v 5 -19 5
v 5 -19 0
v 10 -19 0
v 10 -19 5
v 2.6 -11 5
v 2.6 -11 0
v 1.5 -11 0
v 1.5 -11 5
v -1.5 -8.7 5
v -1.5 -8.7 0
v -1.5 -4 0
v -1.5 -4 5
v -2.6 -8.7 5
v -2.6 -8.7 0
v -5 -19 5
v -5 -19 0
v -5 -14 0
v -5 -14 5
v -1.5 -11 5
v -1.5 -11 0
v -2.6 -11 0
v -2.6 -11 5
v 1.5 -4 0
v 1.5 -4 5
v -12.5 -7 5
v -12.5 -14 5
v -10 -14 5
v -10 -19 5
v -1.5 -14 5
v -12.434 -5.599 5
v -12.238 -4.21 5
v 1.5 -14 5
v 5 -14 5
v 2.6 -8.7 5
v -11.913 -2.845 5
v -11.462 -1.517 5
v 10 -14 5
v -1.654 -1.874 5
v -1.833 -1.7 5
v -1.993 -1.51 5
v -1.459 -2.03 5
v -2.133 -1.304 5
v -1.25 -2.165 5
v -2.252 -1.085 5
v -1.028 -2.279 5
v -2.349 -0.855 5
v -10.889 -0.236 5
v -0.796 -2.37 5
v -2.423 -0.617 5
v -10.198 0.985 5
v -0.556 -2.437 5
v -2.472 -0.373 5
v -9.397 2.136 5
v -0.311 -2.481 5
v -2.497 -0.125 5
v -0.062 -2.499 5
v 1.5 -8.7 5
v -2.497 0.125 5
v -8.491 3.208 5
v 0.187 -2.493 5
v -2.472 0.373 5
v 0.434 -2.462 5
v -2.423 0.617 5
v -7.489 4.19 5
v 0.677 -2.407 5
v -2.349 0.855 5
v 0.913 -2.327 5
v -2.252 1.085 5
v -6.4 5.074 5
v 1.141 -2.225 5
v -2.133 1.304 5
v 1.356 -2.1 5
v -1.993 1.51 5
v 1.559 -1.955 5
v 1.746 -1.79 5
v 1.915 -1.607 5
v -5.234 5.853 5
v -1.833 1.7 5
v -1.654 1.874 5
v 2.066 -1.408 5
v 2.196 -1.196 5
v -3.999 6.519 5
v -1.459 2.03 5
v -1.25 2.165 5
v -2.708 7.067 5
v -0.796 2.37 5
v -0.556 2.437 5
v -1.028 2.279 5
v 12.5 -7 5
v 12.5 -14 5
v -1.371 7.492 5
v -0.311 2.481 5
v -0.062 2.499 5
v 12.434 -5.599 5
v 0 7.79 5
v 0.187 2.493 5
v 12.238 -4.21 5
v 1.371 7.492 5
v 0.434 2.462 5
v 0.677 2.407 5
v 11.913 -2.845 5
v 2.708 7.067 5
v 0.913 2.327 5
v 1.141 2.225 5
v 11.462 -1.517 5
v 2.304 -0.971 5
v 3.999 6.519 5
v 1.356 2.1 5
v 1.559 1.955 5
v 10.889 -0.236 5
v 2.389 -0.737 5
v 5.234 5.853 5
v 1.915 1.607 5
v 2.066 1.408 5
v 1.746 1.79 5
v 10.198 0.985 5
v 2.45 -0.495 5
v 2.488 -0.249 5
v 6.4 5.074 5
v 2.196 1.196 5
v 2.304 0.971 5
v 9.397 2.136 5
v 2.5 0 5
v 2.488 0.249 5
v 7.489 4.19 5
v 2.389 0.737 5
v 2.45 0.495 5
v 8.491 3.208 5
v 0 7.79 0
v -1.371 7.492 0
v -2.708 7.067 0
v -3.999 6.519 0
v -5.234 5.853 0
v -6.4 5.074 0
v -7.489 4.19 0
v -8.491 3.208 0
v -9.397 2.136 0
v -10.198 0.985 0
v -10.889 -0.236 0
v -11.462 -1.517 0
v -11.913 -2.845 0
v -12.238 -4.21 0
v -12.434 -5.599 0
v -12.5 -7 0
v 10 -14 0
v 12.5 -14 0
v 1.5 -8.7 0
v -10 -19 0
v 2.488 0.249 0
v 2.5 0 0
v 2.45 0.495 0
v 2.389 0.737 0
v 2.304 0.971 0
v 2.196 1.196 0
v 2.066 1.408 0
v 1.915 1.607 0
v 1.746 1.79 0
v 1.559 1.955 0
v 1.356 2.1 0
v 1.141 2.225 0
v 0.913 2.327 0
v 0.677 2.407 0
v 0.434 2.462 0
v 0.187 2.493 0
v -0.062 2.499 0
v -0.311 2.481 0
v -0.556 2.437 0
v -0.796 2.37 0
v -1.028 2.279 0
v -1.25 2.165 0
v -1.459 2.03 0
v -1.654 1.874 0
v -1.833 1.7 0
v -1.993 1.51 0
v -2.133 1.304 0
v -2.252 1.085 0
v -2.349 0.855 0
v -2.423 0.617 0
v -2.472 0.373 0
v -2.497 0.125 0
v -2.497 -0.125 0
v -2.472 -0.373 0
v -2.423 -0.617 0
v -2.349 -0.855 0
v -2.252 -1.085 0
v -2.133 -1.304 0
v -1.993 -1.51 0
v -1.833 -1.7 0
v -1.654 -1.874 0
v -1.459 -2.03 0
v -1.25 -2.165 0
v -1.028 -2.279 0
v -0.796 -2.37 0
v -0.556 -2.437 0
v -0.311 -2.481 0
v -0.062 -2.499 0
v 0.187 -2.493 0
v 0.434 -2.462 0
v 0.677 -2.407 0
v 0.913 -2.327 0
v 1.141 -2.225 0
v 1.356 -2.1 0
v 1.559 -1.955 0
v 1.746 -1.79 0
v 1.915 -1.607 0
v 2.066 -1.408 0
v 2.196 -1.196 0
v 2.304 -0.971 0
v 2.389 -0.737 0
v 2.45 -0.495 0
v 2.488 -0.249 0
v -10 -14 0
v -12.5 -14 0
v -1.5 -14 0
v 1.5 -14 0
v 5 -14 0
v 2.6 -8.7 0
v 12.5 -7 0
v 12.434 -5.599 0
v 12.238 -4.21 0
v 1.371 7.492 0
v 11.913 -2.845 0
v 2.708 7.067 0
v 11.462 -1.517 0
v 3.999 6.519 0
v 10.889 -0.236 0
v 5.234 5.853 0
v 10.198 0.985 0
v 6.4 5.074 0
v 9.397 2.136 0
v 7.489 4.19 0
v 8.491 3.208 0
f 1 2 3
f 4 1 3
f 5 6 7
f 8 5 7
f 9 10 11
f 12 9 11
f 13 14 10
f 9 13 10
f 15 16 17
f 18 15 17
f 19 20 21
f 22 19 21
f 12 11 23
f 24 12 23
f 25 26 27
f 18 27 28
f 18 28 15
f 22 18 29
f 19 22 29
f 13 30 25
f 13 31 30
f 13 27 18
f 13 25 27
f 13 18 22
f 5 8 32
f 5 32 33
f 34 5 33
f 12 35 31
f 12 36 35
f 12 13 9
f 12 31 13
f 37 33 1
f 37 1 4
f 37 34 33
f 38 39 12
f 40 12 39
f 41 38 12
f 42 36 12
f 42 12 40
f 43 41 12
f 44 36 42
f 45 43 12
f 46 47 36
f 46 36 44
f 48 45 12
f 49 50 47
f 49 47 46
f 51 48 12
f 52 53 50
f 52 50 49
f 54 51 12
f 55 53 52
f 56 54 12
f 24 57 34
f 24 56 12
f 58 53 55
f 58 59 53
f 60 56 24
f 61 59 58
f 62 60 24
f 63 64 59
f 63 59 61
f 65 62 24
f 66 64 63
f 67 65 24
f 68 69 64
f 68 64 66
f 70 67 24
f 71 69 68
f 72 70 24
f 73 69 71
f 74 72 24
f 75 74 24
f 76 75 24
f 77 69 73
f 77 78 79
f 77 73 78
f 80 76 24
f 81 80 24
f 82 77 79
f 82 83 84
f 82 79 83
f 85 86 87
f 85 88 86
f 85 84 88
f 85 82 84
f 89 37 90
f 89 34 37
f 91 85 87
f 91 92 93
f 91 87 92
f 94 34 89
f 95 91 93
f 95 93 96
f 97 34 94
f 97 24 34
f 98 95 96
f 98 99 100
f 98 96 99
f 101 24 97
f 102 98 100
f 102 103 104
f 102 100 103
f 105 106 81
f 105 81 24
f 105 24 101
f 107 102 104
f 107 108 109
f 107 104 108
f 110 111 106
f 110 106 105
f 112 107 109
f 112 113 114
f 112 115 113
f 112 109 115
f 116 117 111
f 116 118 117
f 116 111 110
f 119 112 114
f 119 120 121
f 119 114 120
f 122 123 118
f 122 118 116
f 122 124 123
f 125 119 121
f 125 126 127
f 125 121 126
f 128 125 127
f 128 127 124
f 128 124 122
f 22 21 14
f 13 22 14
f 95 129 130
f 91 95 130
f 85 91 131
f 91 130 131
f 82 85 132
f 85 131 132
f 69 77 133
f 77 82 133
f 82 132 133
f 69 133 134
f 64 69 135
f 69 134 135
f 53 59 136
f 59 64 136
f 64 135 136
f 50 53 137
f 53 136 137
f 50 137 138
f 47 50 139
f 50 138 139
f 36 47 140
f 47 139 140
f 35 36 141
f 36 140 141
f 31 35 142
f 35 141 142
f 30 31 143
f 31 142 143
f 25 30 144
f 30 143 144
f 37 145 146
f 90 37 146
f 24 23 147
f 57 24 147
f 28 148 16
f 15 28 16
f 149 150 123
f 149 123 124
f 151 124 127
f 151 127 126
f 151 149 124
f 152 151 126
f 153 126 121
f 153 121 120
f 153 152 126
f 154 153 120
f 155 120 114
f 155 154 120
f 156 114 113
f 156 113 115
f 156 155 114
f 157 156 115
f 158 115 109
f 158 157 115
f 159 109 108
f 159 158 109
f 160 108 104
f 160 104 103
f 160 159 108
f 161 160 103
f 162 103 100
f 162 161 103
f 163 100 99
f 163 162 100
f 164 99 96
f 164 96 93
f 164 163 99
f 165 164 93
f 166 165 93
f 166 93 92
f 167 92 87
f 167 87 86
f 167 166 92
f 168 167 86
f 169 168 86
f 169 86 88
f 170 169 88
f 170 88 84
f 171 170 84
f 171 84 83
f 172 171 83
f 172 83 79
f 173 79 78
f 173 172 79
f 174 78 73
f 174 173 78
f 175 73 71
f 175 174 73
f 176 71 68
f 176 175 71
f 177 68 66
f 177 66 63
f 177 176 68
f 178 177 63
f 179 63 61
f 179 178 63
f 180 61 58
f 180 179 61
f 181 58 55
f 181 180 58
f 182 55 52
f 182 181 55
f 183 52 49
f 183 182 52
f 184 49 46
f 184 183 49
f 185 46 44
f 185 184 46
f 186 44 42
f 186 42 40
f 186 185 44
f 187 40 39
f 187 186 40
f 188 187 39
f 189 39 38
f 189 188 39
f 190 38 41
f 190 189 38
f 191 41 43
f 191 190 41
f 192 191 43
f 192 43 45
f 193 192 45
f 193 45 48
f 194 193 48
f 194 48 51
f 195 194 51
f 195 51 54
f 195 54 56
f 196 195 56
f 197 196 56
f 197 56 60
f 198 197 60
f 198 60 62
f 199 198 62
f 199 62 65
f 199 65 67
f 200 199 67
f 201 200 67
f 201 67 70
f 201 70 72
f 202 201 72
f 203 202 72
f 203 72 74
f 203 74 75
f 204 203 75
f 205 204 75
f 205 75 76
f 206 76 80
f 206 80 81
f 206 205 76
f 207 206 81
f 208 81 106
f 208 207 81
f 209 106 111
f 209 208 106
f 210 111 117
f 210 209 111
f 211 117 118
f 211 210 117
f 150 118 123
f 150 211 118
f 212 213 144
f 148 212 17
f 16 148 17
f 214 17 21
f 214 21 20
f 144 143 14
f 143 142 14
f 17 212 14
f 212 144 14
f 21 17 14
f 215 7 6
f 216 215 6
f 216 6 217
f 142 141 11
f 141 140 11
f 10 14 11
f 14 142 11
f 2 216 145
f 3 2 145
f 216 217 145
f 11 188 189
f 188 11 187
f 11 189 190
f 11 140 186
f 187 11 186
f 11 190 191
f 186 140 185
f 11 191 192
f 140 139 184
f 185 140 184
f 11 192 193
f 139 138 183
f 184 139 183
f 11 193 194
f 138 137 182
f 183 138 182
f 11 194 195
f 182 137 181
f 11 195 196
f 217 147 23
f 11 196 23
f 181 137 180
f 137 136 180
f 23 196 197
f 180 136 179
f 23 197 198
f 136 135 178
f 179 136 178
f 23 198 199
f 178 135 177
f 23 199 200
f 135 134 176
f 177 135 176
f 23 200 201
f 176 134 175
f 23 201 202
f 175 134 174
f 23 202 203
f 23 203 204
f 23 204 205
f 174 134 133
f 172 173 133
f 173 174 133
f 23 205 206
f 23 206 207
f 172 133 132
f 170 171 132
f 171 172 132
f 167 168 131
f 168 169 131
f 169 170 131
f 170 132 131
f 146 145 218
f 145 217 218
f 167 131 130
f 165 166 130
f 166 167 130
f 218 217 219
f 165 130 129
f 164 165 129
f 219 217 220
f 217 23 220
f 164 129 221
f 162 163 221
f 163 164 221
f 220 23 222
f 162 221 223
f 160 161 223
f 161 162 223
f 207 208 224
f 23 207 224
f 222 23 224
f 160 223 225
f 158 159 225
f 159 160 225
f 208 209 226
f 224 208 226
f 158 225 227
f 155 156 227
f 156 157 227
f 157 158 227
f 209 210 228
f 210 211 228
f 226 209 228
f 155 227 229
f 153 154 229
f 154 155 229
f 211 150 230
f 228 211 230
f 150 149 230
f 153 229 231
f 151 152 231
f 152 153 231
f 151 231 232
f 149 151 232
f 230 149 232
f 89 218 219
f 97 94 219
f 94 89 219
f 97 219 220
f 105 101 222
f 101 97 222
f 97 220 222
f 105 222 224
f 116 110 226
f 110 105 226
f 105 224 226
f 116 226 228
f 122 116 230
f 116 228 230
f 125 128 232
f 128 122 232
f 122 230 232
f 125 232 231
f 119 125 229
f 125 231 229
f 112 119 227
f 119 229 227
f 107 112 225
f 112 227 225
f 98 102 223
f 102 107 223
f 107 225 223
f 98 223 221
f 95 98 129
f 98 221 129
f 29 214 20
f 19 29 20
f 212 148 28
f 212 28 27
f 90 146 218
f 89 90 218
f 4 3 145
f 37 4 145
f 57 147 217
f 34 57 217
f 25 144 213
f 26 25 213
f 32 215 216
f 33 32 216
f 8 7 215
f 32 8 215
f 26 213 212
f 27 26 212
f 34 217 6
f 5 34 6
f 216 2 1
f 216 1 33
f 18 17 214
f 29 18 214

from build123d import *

# Parameters (mm, degrees)
SKETCH1_R           = 2.5
SKETCH1_W           = 5
SKETCH1_H           = 5
BOSS_EXTRUDE1_DEPTH = 5
FILLET1_R           = 15


with BuildPart() as part:
    # Sketch1 → Boss-Extrude1 (new body)
    # profile 1 of 3: a face of its own
    with BuildSketch(Plane.XY):
        Polygon((-12.5, 8), (-12.5, -14), (-10, -14), (-5, -14), (-1.5, -14), (-1.5, -11), (-2.6, -11), (-2.6, -8.7), (-1.5, -8.7), (-1.5, -4), (1.5, -4), (1.5, -8.7), (2.6, -8.7), (2.6, -11), (1.5, -11), (1.5, -14), (5, -14), (10, -14), (12.5, -14), (12.5, 8), align=None)
        Circle(SKETCH1_R, mode=Mode.SUBTRACT)
    # profile 2 of 3: a face of its own
    with BuildSketch(Plane.XY):
        with Locations((-7.5, -16.5)):
            Rectangle(SKETCH1_W, SKETCH1_H)
    # profile 3 of 3: a face of its own
    with BuildSketch(Plane.XY):
        with Locations((7.5, -16.5)):
            Rectangle(SKETCH1_W, SKETCH1_H)
    extrude(amount=BOSS_EXTRUDE1_DEPTH)

    # Fillet1
    # the kernel refuses this fillet: 15 mm, written as the material it takes off along each edge
    with BuildSketch(Plane(origin=(-12.5, 8, -37.5), x_dir=(0, -1, 0), z_dir=(0, 0, 1)), Plane(origin=(12.5, 8, -37.5), x_dir=(-1, 0, 0), z_dir=(0, 0, 1))) as fillet1_piece_1:
        with BuildLine():
            CenterArc((FILLET1_R, FILLET1_R), FILLET1_R, 180, 90)
            Line((0, FILLET1_R), (0, 0))
            Line((0, 0), (FILLET1_R, 0))
        make_face()
    extrude(amount=80, mode=Mode.SUBTRACT)


solid = part.part
